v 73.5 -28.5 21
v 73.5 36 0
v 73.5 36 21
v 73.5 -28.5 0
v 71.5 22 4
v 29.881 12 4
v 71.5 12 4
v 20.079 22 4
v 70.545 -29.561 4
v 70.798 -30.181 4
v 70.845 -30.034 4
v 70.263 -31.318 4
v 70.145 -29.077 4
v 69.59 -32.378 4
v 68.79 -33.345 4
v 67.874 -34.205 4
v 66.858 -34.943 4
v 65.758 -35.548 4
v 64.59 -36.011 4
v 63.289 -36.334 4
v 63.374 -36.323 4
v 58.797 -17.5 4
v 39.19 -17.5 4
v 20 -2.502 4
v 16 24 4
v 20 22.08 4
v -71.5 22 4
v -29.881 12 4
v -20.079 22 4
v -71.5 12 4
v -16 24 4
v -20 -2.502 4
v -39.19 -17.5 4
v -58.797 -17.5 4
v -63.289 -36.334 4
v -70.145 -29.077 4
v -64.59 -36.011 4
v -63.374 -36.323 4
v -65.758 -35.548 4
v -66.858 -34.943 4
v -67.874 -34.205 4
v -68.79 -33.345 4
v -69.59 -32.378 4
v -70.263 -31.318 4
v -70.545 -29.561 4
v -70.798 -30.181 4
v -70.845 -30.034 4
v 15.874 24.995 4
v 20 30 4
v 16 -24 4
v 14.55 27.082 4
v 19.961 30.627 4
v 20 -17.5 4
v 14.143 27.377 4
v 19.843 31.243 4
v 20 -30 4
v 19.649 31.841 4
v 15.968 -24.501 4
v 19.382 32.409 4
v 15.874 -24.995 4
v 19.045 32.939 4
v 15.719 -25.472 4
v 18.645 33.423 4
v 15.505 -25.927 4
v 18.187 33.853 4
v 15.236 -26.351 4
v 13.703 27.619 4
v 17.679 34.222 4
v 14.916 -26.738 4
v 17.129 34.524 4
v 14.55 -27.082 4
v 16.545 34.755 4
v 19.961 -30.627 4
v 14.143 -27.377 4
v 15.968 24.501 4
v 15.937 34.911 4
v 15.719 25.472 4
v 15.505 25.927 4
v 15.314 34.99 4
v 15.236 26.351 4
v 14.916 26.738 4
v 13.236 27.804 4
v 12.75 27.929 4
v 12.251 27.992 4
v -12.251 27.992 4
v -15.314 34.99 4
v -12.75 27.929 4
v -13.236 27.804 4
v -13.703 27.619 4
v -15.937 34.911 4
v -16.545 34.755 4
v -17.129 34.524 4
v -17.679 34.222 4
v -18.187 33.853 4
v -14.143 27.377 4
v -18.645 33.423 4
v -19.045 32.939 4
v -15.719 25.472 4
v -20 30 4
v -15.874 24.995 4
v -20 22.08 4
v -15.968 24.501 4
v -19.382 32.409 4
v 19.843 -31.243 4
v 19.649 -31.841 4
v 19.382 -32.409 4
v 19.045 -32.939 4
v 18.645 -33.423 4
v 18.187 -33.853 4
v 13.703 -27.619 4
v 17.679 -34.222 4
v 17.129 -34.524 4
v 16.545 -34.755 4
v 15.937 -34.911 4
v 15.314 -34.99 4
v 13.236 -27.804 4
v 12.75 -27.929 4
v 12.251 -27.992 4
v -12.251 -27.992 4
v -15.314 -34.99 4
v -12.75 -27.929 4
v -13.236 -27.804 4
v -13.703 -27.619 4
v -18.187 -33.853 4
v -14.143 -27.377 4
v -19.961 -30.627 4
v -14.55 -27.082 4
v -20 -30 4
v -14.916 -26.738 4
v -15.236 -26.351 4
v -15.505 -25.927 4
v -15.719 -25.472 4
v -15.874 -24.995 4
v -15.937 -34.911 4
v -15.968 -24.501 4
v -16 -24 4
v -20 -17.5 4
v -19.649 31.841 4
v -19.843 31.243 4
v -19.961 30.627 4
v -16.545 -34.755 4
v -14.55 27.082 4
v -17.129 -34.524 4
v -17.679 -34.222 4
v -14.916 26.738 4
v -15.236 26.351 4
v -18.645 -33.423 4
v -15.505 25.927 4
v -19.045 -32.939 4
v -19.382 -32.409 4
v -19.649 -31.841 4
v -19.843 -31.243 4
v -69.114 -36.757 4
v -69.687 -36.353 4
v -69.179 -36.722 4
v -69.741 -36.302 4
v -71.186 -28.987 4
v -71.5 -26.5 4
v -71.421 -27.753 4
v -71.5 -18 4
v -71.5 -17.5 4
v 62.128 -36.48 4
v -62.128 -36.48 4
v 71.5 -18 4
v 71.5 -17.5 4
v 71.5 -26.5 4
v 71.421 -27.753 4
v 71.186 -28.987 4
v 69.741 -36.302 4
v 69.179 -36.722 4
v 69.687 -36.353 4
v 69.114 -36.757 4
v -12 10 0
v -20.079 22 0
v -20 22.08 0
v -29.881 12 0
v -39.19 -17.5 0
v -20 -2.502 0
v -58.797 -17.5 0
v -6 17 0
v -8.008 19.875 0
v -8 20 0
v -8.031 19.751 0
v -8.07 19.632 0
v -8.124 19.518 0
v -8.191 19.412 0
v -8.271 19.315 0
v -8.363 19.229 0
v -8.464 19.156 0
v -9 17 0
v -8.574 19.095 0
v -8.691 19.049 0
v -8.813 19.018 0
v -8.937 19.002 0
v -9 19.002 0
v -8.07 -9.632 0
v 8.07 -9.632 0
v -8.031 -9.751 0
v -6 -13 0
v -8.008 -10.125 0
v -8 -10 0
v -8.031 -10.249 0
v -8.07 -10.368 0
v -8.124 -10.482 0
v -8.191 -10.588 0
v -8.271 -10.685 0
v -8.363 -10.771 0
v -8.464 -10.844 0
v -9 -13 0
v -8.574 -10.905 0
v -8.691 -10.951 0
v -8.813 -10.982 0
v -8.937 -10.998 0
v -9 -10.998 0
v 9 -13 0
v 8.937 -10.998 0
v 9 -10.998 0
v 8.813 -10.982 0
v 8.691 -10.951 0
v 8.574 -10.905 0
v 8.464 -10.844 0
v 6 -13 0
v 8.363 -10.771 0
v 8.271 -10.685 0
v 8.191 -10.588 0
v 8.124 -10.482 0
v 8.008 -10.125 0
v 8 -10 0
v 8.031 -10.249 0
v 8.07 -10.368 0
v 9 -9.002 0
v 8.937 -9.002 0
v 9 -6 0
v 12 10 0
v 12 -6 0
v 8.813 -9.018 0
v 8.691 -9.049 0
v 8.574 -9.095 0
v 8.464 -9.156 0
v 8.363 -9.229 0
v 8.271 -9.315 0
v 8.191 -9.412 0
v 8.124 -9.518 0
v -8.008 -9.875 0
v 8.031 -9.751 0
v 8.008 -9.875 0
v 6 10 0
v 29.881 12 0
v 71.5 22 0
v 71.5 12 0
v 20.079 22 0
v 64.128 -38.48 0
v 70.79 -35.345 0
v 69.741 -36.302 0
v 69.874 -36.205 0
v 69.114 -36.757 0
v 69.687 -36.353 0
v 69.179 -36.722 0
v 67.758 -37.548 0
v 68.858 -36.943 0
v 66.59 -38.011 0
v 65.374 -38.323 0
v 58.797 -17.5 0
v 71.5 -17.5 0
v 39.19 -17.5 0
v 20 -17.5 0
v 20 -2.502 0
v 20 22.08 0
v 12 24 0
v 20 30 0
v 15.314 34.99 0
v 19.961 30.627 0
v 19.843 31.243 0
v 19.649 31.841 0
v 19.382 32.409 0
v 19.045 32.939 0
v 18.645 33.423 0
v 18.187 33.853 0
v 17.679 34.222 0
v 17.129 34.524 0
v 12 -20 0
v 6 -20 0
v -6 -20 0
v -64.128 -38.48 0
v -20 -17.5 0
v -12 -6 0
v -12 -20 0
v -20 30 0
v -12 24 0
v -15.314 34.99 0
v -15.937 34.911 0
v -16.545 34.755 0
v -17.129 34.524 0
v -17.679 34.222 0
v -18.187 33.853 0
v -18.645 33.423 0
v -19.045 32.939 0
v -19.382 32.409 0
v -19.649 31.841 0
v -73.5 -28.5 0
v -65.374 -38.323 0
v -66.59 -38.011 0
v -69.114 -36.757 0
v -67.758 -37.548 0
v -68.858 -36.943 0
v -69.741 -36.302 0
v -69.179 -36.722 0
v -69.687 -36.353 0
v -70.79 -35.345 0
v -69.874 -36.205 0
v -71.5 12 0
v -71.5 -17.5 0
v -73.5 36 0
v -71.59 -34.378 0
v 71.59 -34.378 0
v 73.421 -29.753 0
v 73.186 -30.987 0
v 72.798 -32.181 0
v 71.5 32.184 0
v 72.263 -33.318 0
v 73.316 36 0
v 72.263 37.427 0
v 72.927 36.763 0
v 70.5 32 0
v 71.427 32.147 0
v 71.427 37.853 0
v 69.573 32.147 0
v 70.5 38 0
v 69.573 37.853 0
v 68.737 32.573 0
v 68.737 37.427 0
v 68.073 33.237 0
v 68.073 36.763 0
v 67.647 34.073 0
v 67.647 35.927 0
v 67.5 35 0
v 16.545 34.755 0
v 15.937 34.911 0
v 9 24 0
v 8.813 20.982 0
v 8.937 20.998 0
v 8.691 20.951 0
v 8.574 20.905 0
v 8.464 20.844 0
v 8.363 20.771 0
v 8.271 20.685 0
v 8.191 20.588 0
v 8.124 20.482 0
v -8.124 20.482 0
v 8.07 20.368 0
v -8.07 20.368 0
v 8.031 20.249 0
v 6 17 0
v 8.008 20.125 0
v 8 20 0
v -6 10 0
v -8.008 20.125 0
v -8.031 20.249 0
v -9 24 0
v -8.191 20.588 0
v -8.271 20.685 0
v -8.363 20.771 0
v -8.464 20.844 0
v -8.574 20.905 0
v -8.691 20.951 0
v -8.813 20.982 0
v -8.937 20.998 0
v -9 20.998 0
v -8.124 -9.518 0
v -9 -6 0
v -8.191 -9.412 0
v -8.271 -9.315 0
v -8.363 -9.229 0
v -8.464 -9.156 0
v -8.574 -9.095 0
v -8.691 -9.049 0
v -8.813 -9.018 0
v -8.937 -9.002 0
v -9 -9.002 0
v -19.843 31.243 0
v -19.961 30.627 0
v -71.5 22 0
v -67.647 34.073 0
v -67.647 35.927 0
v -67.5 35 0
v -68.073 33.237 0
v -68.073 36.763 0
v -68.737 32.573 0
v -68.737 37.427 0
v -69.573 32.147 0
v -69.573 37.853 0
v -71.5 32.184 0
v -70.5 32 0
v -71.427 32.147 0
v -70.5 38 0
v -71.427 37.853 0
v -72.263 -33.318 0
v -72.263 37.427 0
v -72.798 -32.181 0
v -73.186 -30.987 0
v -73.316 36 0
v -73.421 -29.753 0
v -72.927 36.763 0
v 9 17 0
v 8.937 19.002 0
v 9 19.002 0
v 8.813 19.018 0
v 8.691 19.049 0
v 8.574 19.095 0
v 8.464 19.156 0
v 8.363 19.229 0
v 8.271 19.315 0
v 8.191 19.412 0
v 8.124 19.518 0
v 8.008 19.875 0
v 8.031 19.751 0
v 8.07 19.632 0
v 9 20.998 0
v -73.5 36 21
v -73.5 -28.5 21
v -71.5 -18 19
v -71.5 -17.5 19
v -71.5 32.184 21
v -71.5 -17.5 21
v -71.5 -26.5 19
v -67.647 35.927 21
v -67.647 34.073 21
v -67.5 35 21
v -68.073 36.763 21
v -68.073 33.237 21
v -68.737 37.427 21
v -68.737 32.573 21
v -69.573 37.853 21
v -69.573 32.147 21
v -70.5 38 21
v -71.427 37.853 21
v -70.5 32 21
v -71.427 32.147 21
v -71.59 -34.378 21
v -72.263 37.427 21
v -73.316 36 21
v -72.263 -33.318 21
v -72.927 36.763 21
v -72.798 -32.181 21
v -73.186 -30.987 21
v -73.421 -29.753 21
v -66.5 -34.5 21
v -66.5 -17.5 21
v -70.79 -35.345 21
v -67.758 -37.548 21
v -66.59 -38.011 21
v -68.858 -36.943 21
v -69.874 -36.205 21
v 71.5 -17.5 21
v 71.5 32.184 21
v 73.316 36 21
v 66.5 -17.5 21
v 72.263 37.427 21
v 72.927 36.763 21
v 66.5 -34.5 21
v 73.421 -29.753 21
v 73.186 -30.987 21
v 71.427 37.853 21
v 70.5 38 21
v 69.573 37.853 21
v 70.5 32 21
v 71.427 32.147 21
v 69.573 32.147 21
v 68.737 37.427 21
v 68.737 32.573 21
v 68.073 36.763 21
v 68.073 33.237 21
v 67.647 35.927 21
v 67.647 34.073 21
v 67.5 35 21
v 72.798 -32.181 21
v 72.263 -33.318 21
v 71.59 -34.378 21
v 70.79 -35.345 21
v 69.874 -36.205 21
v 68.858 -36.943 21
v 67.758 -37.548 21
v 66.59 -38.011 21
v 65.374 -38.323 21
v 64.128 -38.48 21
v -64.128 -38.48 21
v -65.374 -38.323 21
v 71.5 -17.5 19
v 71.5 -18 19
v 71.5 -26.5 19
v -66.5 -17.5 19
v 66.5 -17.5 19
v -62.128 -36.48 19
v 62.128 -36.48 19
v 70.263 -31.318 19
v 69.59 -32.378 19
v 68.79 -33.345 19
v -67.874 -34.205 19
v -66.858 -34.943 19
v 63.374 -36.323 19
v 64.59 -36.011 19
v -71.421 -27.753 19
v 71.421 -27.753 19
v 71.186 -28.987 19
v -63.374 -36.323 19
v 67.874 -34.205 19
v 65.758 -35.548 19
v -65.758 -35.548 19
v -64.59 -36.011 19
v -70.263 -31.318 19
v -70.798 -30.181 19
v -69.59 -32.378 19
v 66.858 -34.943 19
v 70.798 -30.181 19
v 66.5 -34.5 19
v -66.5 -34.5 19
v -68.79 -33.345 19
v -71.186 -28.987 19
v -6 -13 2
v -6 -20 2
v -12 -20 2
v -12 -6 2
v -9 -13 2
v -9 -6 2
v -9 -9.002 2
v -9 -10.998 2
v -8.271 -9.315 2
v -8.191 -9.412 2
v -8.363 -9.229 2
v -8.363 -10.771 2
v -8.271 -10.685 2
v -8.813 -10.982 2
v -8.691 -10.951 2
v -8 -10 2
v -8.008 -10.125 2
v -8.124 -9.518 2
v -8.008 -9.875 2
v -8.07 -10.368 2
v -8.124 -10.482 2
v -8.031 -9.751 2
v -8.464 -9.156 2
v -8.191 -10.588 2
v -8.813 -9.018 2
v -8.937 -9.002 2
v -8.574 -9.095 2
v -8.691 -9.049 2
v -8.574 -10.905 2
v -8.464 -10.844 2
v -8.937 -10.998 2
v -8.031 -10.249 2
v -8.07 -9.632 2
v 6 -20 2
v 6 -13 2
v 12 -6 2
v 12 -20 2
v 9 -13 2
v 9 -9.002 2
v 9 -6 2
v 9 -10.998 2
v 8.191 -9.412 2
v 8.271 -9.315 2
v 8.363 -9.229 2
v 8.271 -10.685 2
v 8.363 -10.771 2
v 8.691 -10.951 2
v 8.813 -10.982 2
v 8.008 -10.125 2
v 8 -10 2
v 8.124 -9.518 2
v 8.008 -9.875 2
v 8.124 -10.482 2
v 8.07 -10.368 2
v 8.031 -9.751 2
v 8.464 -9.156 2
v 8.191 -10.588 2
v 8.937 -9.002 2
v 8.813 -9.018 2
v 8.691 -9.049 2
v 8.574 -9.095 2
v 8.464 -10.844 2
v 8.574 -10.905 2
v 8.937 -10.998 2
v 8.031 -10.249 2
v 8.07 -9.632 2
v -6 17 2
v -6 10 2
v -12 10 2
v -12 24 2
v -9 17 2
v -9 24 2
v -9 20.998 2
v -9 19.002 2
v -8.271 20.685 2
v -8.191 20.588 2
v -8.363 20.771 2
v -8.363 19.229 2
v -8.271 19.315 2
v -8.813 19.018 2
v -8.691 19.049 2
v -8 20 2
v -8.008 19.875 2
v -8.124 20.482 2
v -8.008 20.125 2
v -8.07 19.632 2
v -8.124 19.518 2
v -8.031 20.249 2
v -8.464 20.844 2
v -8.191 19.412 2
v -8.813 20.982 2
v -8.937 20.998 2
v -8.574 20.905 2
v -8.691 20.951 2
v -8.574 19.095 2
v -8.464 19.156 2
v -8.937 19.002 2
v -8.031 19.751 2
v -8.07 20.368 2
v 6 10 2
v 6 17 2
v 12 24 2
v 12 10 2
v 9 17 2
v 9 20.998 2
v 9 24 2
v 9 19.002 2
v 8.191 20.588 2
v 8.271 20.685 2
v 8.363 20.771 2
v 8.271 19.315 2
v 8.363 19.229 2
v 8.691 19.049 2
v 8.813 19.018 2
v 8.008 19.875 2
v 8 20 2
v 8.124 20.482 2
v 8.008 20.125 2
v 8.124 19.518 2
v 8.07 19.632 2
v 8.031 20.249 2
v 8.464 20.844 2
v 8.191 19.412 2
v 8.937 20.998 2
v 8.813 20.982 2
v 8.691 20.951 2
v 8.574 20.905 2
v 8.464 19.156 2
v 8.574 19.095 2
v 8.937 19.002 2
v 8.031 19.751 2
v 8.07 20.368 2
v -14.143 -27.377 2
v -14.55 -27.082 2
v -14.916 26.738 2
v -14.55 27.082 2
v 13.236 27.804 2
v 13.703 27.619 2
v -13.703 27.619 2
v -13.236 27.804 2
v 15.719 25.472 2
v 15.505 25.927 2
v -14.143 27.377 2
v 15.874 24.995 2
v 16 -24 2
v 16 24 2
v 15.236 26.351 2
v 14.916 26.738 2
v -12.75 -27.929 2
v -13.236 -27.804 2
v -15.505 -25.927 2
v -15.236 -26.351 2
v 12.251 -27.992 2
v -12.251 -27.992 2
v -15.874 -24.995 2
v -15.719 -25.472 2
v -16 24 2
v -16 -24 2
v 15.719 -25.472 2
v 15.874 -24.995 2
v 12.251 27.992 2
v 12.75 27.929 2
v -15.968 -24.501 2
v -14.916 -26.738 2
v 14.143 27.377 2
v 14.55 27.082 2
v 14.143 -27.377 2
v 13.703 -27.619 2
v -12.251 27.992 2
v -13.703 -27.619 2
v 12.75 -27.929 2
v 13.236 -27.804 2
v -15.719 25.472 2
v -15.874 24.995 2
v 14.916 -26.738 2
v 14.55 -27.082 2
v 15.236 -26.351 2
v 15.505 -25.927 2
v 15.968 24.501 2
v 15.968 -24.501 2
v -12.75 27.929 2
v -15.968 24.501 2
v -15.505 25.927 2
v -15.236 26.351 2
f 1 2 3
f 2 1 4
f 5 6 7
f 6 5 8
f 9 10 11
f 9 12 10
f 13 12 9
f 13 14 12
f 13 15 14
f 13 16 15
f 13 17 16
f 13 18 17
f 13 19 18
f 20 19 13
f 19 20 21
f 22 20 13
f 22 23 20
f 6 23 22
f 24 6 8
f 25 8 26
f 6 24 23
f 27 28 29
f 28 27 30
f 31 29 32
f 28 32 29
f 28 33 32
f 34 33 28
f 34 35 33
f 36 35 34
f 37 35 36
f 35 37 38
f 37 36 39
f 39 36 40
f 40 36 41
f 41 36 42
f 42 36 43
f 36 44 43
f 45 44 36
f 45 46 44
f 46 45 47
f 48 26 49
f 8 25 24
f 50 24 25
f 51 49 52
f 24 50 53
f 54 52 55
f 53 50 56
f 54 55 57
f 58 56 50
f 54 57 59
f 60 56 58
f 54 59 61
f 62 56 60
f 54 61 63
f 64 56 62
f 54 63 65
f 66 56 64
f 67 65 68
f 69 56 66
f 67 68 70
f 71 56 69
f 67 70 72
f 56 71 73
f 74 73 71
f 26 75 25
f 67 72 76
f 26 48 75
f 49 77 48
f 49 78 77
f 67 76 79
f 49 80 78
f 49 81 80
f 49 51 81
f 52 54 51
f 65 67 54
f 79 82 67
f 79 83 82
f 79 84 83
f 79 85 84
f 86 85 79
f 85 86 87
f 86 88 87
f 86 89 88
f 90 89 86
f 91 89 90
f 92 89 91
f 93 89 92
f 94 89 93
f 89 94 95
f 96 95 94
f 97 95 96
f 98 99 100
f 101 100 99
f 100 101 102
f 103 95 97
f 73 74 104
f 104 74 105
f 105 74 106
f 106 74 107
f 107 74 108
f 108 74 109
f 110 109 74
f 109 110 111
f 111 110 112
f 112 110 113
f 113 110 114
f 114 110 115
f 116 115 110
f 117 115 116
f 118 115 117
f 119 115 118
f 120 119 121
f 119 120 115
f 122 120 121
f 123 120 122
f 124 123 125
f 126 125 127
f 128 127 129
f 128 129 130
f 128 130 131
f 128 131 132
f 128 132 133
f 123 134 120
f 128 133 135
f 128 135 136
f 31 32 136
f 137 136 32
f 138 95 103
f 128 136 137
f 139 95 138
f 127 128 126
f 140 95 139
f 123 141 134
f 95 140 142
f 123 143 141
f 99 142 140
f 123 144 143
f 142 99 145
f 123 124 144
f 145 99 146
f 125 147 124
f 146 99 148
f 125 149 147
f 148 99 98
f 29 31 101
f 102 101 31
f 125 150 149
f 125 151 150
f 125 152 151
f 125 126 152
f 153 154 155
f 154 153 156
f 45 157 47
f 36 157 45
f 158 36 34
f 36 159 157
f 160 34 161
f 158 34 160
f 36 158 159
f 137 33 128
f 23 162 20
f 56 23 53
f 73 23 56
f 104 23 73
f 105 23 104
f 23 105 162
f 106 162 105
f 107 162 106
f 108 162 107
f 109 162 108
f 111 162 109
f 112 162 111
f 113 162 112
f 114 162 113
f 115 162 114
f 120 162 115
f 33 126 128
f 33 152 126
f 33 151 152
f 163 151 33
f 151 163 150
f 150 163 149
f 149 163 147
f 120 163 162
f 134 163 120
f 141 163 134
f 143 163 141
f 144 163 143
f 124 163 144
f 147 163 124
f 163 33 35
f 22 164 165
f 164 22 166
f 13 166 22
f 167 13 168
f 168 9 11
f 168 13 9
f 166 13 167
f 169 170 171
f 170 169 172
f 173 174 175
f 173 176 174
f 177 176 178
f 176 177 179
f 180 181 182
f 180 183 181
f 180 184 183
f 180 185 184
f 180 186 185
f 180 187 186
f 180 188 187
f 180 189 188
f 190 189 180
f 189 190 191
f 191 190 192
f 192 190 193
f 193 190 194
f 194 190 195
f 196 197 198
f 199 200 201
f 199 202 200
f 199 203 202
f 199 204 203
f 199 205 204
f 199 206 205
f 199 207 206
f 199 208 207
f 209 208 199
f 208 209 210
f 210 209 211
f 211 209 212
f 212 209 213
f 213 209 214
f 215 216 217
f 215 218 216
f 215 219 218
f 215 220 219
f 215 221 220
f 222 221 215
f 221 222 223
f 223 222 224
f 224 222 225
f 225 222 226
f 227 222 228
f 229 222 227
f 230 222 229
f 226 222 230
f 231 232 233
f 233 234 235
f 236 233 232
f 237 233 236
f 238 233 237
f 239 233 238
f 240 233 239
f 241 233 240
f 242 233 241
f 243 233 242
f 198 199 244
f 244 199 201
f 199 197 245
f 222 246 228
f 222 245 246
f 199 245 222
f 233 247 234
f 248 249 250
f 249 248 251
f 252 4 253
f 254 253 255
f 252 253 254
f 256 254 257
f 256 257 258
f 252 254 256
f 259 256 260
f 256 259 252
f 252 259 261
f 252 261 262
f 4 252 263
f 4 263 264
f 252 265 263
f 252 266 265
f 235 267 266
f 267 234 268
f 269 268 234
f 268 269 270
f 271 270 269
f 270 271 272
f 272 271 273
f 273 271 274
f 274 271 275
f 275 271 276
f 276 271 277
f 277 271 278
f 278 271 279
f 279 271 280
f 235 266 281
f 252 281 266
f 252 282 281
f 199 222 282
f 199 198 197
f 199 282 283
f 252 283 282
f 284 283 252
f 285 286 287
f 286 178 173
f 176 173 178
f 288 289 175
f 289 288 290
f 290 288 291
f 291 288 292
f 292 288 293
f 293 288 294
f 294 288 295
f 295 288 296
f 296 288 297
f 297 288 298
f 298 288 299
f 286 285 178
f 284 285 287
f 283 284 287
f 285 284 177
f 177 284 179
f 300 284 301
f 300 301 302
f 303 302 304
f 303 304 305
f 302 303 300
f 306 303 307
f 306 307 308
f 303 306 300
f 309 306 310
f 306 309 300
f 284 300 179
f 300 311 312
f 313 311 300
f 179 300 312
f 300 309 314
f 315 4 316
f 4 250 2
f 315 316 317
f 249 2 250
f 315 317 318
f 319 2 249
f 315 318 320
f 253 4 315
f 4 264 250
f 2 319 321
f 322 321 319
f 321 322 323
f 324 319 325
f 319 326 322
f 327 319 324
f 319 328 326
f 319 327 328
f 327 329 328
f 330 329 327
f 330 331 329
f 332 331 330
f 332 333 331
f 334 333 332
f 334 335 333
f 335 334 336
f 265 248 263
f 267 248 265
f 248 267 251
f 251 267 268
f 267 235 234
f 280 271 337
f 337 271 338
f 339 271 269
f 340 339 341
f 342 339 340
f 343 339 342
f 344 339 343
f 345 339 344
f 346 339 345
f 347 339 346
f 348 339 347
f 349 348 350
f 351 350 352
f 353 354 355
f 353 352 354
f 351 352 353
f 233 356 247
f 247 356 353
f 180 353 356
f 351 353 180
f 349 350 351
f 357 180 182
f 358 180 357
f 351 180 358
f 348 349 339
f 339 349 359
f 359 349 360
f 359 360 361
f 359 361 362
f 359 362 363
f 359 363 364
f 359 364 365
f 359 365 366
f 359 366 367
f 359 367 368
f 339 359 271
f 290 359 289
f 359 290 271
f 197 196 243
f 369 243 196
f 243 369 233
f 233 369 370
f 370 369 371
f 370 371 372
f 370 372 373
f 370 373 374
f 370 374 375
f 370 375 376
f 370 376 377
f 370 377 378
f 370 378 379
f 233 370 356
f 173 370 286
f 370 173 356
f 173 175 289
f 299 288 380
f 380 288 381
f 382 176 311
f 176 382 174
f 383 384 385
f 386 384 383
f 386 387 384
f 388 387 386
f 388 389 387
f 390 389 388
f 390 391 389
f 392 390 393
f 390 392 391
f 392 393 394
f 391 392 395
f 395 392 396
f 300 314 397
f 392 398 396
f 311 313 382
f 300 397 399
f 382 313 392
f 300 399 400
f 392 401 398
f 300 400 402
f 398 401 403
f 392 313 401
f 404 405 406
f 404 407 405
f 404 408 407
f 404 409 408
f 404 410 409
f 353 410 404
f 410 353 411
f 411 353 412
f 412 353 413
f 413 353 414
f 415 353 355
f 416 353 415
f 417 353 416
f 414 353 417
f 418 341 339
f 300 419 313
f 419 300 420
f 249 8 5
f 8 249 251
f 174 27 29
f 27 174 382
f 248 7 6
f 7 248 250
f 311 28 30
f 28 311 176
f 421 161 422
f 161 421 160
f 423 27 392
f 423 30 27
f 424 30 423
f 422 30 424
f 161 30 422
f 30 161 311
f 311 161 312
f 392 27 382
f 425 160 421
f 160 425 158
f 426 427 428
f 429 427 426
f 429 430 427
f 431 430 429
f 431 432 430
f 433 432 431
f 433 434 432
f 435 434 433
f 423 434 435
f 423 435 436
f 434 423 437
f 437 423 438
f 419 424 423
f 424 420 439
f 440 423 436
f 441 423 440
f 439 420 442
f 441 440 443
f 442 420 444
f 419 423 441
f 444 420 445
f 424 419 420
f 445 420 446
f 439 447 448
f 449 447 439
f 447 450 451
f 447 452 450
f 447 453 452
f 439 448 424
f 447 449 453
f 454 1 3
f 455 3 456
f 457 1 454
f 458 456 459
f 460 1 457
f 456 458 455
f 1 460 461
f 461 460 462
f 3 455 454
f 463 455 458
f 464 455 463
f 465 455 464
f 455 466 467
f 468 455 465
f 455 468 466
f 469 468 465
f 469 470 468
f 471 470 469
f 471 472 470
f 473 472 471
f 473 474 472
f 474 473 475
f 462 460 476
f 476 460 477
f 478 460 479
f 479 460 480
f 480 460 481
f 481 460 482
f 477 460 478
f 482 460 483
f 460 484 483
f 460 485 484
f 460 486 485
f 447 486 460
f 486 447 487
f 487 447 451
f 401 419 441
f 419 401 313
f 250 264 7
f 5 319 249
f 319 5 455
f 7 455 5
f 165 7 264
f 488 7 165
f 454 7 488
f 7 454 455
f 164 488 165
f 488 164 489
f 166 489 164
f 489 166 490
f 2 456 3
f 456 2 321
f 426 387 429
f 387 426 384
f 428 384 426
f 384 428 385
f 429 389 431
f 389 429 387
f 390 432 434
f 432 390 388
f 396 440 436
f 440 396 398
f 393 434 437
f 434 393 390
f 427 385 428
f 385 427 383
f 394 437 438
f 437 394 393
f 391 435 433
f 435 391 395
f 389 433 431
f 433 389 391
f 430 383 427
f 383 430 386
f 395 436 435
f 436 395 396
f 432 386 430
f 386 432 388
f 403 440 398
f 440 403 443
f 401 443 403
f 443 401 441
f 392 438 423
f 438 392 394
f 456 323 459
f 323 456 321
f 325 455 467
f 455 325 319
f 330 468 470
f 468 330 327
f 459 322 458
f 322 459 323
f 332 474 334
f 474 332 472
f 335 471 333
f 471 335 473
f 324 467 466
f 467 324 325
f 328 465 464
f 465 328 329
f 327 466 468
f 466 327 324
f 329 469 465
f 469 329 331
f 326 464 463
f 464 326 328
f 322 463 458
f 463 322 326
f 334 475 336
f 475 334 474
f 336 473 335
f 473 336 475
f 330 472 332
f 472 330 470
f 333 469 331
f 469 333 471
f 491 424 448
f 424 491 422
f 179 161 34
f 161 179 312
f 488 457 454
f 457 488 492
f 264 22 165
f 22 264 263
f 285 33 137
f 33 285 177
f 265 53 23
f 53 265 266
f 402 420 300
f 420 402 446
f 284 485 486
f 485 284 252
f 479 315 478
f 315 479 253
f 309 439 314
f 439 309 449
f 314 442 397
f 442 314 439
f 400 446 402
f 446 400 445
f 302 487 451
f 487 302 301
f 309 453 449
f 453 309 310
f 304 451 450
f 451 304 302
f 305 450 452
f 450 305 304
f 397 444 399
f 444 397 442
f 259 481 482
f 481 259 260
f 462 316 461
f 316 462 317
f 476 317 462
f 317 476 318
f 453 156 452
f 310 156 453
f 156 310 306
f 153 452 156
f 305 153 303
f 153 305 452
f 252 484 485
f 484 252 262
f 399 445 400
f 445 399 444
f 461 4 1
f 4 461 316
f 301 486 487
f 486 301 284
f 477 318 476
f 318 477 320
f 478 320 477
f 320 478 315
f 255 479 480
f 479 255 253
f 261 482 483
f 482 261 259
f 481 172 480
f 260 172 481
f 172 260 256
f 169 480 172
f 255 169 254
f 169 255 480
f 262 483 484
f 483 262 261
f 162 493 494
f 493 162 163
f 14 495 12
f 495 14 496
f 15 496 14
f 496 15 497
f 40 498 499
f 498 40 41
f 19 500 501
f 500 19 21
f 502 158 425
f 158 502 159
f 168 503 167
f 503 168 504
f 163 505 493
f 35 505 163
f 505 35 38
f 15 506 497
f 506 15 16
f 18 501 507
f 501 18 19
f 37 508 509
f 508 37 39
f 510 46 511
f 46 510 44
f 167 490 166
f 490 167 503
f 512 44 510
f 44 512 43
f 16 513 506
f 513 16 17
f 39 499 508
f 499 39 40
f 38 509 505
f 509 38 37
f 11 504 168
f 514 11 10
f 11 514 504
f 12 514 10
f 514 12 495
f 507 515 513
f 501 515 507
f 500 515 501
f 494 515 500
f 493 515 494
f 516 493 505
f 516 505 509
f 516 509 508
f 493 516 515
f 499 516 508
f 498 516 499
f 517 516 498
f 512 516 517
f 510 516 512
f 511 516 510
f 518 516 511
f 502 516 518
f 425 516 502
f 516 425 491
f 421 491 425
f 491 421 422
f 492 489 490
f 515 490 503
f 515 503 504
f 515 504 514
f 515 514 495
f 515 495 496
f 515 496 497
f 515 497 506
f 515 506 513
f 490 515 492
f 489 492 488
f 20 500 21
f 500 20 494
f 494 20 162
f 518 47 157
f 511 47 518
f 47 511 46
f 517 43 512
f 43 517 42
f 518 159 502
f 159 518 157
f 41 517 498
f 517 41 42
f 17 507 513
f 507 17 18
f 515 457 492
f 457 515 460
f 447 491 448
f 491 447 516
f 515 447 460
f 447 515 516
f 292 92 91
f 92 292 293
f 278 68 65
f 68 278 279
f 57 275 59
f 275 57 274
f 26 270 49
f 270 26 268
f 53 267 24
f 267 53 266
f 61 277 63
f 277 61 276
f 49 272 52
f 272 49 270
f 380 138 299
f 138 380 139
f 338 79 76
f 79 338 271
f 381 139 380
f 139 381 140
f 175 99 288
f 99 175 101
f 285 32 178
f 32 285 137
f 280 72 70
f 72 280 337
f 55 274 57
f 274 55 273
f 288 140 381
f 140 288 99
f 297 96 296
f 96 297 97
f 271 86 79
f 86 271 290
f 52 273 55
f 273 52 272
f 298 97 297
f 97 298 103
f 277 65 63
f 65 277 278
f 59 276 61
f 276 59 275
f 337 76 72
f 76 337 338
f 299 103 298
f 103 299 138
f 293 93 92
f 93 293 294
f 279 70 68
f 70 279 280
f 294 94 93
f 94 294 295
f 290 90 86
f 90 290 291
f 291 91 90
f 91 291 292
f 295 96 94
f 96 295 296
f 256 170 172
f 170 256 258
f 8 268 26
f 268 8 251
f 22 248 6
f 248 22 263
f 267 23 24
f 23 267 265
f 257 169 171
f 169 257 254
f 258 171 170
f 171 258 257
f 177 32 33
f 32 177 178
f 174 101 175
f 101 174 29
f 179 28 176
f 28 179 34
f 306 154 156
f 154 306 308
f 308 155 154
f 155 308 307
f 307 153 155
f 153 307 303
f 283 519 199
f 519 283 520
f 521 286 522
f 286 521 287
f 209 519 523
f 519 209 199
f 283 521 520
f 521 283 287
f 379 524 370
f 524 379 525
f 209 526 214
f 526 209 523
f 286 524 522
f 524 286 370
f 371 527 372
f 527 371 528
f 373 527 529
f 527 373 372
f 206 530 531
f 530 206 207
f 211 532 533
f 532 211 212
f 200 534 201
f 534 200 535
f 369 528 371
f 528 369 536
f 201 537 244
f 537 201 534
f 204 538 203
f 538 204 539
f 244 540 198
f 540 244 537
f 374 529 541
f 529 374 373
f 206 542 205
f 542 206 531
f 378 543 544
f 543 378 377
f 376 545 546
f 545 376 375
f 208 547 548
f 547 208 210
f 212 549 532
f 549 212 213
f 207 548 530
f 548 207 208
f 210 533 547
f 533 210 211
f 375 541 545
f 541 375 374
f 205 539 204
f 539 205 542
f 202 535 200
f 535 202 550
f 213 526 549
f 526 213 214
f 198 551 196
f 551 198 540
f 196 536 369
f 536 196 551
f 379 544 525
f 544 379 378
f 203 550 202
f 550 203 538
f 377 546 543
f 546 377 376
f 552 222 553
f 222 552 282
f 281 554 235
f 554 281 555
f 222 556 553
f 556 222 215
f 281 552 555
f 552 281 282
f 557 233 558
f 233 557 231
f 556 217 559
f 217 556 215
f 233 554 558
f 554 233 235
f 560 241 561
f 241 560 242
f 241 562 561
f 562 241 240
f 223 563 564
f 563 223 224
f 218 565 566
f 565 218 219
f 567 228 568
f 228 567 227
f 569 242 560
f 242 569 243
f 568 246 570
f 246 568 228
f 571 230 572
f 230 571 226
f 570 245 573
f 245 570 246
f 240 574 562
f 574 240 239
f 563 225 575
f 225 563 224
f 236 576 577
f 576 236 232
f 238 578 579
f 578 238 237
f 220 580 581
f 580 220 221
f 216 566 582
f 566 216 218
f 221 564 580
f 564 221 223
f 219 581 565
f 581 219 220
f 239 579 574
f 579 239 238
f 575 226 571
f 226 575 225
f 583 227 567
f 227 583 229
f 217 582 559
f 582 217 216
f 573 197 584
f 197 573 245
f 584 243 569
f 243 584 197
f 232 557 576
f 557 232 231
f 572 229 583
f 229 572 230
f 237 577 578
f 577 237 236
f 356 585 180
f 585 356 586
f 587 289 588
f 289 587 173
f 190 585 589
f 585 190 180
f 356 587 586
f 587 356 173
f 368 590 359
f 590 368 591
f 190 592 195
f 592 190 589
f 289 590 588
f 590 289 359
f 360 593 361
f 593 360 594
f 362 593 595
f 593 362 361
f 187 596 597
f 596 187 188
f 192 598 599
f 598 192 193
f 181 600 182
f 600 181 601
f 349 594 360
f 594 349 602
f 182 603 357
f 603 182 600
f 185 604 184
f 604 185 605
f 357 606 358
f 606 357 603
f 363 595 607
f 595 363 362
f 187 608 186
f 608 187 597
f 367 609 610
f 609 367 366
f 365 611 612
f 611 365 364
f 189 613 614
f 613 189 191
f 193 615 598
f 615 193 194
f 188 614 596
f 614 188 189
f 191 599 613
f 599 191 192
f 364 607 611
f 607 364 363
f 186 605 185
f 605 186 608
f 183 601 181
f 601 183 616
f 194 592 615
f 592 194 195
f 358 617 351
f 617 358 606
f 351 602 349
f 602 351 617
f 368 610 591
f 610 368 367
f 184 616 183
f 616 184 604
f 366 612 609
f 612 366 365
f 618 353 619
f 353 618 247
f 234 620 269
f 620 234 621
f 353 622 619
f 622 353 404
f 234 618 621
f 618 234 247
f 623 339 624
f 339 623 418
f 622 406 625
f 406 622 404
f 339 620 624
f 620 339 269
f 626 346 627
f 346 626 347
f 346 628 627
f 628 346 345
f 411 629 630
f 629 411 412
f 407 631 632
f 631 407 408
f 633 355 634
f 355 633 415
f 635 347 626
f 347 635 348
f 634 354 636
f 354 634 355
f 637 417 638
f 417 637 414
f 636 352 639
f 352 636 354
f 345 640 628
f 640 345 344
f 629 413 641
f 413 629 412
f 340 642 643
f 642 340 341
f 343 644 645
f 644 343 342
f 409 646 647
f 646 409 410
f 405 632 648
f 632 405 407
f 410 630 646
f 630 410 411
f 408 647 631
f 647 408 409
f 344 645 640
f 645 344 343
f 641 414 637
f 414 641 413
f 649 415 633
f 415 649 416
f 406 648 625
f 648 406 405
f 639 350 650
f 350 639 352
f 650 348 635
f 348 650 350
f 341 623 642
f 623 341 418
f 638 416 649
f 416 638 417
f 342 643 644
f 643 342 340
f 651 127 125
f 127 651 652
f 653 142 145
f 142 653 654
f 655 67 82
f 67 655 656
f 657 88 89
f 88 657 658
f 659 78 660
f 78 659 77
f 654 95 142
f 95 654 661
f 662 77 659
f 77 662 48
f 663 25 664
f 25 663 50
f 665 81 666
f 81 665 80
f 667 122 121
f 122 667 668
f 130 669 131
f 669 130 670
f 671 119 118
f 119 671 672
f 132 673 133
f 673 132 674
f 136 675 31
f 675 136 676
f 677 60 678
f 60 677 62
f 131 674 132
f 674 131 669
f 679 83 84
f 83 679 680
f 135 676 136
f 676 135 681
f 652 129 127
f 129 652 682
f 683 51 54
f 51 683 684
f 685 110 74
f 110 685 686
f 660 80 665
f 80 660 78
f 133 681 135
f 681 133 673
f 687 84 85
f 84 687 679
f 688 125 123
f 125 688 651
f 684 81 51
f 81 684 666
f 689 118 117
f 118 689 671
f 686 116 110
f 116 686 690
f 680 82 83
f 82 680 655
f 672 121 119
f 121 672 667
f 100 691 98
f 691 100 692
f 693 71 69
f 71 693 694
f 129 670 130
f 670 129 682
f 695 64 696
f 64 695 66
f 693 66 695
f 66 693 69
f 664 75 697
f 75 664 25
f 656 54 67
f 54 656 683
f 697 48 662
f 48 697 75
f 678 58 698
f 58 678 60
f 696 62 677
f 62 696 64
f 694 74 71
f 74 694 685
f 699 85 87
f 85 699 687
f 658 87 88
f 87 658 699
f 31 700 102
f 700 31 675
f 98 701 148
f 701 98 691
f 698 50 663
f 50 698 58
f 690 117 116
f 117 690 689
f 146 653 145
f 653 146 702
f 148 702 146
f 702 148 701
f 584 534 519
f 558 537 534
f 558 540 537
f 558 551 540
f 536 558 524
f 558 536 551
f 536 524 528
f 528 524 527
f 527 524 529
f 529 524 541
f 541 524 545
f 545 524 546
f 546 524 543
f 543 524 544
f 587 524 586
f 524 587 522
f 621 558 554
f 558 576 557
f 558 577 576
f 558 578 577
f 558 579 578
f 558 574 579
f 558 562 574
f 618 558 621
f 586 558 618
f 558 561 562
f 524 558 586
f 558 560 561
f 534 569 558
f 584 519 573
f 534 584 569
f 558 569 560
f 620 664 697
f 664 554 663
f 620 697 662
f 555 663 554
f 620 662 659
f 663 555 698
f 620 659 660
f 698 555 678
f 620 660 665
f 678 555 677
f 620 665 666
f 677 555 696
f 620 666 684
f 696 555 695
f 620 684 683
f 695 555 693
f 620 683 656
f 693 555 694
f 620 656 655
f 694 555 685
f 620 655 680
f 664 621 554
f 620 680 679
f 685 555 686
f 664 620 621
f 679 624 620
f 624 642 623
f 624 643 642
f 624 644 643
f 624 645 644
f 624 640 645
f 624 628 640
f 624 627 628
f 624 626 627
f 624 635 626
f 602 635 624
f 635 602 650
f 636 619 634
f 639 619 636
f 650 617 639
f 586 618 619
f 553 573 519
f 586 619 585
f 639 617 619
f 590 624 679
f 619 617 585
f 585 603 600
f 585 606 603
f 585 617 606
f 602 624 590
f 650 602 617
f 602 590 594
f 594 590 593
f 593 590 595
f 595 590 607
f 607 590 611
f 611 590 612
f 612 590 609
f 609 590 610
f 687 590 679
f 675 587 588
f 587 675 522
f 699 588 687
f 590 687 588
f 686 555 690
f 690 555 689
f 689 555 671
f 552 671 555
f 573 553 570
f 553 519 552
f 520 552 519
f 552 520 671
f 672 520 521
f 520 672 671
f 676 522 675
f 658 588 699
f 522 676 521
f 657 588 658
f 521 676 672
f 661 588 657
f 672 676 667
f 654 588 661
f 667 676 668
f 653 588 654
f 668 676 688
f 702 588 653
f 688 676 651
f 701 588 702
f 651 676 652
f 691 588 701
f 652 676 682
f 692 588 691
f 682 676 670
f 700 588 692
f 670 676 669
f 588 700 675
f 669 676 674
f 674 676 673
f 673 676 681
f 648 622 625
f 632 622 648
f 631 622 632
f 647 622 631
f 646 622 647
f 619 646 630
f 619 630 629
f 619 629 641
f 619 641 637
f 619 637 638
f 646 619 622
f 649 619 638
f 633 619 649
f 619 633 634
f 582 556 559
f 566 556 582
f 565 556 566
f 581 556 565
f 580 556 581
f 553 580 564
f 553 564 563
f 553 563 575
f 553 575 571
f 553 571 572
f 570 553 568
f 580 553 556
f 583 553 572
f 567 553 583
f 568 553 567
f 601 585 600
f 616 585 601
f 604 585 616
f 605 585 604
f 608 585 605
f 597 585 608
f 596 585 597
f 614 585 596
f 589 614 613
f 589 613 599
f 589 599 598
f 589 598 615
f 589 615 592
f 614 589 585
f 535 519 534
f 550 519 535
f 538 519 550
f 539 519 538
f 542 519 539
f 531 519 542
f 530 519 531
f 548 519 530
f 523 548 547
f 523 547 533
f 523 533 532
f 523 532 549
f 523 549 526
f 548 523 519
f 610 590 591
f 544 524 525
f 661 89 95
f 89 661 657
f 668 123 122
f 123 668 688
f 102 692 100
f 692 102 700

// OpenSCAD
phone_width = 143;
phone_length = 73;
phone_height = 15;
radius_phone = 10;

/* [Hidden] */
height = 4;
radius = 5;

$fn=50;

//#phone();

difference() {
    union() {
        difference() {
            base_plate();
        }
        lower_connector();
        mirror([1,0,0]) lower_connector();
        // No upper connector
        //upper_connector();
        middle_part();
        lower_part();
        // No upper part
        //upper_part();
    }
    translate([0,0,height-2]) scale([0.8,0.8,1]) base_plate(); 
    mount_grid();
}

module phone() {    
    color("blue", 0.2) hull() {
        translate([phone_width/2-radius_phone, phone_length/2-radius_phone, height]) cylinder(r=radius_phone,h=phone_height);
        translate([phone_width/2-radius_phone, -phone_length/2+radius_phone, height]) cylinder(r=radius_phone,h=phone_height);
        translate([-phone_width/2+radius_phone, phone_length/2-radius_phone, height]) cylinder(r=radius_phone,h=phone_height);
        translate([-phone_width/2+radius_phone, -phone_length/2+radius_phone, height]) cylinder(r=radius_phone,h=phone_height);
    }
}

module base_plate() {
    hull() {
        translate([15, 30, 0]) cylinder(r=radius,h=height);
        translate([15, -30, 0]) cylinder(r=radius,h=height);
        translate([-15, 30, 0]) cylinder(r=radius,h=height);
        translate([-15, -30, 0]) cylinder(r=radius,h=height);
    }
}

module upper_connector() {
    hull() {
        translate([0, 20, height/2]) cube([4*radius, 4*radius, height], center = true);
        translate([0, phone_length/2, height/2]) cube([2*radius, 2*radius, height], center = true);
    }
}

module upper_part() {
    translate([0, phone_length/2+radius, 1]) rotate([0,90,0]) {
        hull() {
            cylinder(r=1,h=2*radius, center=true);
            translate([-phone_height+2, 0, 0]) cylinder(r=0.5,h=2*radius, center=true);
        }        
        translate([-phone_height-4, 0, 0]) difference() {
            cylinder(r=6, h=2*radius, center=true);
            cylinder(r=5, h=2*radius, center=true);
            translate([-10,0.5,-10]) cube([20, 10, 20]);
            translate([-15,-12,-10]) rotate([0,0,45]) cube([20, 10, 20]);
        }
        #translate([-phone_height-12,-5.5,-radius]) rotate([0,0,45])  cube([radius, 1, 2*radius]);
    }
}

module lower_connector() {
    hull() {
        translate([10, 18, 0]) cylinder(r=2*radius,h=height);
        translate([phone_width/2-5, -phone_length/2+4, 0]) cylinder(r=radius,h=height);
    }
    // No rotation of lower part
    //translate([phone_width/2-10, -phone_length/2+4, 0]) cylinder(r=radius,h=7);
}

module lower_part() {
    // No rotation of lower part
    rotate([/*-5*/0,0,0]) difference() {
        hull() {
            translate([0, -phone_length/2+18, (phone_height + 2+height)/2]) cube([phone_width + 4, 2, phone_height + 2+height], center=true);
            translate([-phone_width/2+radius+3, -phone_length/2+radius_phone - 2, 0]) cylinder(r=radius_phone,h=phone_height + 2+height);
            translate([phone_width/2-radius-3, -phone_length/2+radius_phone - 2, 0]) cylinder(r=radius_phone,h=phone_height + 2+height);
        }
        phone();
        // cut out for display
        //translate([0,10,20]) cube([phone_width, phone_length, phone_height], center=true);
        // cut out for microphone
        translate([0,2,20]) cube([phone_width-10, phone_length, phone_height], center=true);
        // cut out for charger
        //translate([0,-12,16]) cube([15, phone_length, phone_height], center=true);
    }
}

module middle_part() {
    translate([0,17,height/2]) {
        cube([phone_width+4, 10, height], center = true);
        translate([-phone_width/2-2,-35,-height/2]) cube([2, 54, phone_height + 2+height]);
        translate([phone_width/2,-35,-height/2]) cube([2, 54, phone_height + 2+height]);

        translate([-phone_width/2+1,18,-height/2]) cylinder(r=3, h=phone_height+2+height, $fn=20);
        translate([+phone_width/2-1,18,-height/2]) cylinder(r=3, h=phone_height+2+height, $fn=20);
    }
}

module mount_grid() {
    translate([-10.5, -20, 0]) mount_grid_module();
    translate([10.5, -20, 0]) mirror([180,0,0]) mount_grid_module();
    translate([-10.5, 10, 0]) mount_grid_module();
    translate([10.5, 10, 0]) mirror([180,0,0]) mount_grid_module();
}

module mount_grid_module() {    
    translate([-1.5, 0, -10]) cube([6, 7, 20]);
    translate([-1.5, 7, -10]) cube([3, 7, 20]);
    translate([1.5, 10, -10]) cylinder(r=1,h=20);
}
